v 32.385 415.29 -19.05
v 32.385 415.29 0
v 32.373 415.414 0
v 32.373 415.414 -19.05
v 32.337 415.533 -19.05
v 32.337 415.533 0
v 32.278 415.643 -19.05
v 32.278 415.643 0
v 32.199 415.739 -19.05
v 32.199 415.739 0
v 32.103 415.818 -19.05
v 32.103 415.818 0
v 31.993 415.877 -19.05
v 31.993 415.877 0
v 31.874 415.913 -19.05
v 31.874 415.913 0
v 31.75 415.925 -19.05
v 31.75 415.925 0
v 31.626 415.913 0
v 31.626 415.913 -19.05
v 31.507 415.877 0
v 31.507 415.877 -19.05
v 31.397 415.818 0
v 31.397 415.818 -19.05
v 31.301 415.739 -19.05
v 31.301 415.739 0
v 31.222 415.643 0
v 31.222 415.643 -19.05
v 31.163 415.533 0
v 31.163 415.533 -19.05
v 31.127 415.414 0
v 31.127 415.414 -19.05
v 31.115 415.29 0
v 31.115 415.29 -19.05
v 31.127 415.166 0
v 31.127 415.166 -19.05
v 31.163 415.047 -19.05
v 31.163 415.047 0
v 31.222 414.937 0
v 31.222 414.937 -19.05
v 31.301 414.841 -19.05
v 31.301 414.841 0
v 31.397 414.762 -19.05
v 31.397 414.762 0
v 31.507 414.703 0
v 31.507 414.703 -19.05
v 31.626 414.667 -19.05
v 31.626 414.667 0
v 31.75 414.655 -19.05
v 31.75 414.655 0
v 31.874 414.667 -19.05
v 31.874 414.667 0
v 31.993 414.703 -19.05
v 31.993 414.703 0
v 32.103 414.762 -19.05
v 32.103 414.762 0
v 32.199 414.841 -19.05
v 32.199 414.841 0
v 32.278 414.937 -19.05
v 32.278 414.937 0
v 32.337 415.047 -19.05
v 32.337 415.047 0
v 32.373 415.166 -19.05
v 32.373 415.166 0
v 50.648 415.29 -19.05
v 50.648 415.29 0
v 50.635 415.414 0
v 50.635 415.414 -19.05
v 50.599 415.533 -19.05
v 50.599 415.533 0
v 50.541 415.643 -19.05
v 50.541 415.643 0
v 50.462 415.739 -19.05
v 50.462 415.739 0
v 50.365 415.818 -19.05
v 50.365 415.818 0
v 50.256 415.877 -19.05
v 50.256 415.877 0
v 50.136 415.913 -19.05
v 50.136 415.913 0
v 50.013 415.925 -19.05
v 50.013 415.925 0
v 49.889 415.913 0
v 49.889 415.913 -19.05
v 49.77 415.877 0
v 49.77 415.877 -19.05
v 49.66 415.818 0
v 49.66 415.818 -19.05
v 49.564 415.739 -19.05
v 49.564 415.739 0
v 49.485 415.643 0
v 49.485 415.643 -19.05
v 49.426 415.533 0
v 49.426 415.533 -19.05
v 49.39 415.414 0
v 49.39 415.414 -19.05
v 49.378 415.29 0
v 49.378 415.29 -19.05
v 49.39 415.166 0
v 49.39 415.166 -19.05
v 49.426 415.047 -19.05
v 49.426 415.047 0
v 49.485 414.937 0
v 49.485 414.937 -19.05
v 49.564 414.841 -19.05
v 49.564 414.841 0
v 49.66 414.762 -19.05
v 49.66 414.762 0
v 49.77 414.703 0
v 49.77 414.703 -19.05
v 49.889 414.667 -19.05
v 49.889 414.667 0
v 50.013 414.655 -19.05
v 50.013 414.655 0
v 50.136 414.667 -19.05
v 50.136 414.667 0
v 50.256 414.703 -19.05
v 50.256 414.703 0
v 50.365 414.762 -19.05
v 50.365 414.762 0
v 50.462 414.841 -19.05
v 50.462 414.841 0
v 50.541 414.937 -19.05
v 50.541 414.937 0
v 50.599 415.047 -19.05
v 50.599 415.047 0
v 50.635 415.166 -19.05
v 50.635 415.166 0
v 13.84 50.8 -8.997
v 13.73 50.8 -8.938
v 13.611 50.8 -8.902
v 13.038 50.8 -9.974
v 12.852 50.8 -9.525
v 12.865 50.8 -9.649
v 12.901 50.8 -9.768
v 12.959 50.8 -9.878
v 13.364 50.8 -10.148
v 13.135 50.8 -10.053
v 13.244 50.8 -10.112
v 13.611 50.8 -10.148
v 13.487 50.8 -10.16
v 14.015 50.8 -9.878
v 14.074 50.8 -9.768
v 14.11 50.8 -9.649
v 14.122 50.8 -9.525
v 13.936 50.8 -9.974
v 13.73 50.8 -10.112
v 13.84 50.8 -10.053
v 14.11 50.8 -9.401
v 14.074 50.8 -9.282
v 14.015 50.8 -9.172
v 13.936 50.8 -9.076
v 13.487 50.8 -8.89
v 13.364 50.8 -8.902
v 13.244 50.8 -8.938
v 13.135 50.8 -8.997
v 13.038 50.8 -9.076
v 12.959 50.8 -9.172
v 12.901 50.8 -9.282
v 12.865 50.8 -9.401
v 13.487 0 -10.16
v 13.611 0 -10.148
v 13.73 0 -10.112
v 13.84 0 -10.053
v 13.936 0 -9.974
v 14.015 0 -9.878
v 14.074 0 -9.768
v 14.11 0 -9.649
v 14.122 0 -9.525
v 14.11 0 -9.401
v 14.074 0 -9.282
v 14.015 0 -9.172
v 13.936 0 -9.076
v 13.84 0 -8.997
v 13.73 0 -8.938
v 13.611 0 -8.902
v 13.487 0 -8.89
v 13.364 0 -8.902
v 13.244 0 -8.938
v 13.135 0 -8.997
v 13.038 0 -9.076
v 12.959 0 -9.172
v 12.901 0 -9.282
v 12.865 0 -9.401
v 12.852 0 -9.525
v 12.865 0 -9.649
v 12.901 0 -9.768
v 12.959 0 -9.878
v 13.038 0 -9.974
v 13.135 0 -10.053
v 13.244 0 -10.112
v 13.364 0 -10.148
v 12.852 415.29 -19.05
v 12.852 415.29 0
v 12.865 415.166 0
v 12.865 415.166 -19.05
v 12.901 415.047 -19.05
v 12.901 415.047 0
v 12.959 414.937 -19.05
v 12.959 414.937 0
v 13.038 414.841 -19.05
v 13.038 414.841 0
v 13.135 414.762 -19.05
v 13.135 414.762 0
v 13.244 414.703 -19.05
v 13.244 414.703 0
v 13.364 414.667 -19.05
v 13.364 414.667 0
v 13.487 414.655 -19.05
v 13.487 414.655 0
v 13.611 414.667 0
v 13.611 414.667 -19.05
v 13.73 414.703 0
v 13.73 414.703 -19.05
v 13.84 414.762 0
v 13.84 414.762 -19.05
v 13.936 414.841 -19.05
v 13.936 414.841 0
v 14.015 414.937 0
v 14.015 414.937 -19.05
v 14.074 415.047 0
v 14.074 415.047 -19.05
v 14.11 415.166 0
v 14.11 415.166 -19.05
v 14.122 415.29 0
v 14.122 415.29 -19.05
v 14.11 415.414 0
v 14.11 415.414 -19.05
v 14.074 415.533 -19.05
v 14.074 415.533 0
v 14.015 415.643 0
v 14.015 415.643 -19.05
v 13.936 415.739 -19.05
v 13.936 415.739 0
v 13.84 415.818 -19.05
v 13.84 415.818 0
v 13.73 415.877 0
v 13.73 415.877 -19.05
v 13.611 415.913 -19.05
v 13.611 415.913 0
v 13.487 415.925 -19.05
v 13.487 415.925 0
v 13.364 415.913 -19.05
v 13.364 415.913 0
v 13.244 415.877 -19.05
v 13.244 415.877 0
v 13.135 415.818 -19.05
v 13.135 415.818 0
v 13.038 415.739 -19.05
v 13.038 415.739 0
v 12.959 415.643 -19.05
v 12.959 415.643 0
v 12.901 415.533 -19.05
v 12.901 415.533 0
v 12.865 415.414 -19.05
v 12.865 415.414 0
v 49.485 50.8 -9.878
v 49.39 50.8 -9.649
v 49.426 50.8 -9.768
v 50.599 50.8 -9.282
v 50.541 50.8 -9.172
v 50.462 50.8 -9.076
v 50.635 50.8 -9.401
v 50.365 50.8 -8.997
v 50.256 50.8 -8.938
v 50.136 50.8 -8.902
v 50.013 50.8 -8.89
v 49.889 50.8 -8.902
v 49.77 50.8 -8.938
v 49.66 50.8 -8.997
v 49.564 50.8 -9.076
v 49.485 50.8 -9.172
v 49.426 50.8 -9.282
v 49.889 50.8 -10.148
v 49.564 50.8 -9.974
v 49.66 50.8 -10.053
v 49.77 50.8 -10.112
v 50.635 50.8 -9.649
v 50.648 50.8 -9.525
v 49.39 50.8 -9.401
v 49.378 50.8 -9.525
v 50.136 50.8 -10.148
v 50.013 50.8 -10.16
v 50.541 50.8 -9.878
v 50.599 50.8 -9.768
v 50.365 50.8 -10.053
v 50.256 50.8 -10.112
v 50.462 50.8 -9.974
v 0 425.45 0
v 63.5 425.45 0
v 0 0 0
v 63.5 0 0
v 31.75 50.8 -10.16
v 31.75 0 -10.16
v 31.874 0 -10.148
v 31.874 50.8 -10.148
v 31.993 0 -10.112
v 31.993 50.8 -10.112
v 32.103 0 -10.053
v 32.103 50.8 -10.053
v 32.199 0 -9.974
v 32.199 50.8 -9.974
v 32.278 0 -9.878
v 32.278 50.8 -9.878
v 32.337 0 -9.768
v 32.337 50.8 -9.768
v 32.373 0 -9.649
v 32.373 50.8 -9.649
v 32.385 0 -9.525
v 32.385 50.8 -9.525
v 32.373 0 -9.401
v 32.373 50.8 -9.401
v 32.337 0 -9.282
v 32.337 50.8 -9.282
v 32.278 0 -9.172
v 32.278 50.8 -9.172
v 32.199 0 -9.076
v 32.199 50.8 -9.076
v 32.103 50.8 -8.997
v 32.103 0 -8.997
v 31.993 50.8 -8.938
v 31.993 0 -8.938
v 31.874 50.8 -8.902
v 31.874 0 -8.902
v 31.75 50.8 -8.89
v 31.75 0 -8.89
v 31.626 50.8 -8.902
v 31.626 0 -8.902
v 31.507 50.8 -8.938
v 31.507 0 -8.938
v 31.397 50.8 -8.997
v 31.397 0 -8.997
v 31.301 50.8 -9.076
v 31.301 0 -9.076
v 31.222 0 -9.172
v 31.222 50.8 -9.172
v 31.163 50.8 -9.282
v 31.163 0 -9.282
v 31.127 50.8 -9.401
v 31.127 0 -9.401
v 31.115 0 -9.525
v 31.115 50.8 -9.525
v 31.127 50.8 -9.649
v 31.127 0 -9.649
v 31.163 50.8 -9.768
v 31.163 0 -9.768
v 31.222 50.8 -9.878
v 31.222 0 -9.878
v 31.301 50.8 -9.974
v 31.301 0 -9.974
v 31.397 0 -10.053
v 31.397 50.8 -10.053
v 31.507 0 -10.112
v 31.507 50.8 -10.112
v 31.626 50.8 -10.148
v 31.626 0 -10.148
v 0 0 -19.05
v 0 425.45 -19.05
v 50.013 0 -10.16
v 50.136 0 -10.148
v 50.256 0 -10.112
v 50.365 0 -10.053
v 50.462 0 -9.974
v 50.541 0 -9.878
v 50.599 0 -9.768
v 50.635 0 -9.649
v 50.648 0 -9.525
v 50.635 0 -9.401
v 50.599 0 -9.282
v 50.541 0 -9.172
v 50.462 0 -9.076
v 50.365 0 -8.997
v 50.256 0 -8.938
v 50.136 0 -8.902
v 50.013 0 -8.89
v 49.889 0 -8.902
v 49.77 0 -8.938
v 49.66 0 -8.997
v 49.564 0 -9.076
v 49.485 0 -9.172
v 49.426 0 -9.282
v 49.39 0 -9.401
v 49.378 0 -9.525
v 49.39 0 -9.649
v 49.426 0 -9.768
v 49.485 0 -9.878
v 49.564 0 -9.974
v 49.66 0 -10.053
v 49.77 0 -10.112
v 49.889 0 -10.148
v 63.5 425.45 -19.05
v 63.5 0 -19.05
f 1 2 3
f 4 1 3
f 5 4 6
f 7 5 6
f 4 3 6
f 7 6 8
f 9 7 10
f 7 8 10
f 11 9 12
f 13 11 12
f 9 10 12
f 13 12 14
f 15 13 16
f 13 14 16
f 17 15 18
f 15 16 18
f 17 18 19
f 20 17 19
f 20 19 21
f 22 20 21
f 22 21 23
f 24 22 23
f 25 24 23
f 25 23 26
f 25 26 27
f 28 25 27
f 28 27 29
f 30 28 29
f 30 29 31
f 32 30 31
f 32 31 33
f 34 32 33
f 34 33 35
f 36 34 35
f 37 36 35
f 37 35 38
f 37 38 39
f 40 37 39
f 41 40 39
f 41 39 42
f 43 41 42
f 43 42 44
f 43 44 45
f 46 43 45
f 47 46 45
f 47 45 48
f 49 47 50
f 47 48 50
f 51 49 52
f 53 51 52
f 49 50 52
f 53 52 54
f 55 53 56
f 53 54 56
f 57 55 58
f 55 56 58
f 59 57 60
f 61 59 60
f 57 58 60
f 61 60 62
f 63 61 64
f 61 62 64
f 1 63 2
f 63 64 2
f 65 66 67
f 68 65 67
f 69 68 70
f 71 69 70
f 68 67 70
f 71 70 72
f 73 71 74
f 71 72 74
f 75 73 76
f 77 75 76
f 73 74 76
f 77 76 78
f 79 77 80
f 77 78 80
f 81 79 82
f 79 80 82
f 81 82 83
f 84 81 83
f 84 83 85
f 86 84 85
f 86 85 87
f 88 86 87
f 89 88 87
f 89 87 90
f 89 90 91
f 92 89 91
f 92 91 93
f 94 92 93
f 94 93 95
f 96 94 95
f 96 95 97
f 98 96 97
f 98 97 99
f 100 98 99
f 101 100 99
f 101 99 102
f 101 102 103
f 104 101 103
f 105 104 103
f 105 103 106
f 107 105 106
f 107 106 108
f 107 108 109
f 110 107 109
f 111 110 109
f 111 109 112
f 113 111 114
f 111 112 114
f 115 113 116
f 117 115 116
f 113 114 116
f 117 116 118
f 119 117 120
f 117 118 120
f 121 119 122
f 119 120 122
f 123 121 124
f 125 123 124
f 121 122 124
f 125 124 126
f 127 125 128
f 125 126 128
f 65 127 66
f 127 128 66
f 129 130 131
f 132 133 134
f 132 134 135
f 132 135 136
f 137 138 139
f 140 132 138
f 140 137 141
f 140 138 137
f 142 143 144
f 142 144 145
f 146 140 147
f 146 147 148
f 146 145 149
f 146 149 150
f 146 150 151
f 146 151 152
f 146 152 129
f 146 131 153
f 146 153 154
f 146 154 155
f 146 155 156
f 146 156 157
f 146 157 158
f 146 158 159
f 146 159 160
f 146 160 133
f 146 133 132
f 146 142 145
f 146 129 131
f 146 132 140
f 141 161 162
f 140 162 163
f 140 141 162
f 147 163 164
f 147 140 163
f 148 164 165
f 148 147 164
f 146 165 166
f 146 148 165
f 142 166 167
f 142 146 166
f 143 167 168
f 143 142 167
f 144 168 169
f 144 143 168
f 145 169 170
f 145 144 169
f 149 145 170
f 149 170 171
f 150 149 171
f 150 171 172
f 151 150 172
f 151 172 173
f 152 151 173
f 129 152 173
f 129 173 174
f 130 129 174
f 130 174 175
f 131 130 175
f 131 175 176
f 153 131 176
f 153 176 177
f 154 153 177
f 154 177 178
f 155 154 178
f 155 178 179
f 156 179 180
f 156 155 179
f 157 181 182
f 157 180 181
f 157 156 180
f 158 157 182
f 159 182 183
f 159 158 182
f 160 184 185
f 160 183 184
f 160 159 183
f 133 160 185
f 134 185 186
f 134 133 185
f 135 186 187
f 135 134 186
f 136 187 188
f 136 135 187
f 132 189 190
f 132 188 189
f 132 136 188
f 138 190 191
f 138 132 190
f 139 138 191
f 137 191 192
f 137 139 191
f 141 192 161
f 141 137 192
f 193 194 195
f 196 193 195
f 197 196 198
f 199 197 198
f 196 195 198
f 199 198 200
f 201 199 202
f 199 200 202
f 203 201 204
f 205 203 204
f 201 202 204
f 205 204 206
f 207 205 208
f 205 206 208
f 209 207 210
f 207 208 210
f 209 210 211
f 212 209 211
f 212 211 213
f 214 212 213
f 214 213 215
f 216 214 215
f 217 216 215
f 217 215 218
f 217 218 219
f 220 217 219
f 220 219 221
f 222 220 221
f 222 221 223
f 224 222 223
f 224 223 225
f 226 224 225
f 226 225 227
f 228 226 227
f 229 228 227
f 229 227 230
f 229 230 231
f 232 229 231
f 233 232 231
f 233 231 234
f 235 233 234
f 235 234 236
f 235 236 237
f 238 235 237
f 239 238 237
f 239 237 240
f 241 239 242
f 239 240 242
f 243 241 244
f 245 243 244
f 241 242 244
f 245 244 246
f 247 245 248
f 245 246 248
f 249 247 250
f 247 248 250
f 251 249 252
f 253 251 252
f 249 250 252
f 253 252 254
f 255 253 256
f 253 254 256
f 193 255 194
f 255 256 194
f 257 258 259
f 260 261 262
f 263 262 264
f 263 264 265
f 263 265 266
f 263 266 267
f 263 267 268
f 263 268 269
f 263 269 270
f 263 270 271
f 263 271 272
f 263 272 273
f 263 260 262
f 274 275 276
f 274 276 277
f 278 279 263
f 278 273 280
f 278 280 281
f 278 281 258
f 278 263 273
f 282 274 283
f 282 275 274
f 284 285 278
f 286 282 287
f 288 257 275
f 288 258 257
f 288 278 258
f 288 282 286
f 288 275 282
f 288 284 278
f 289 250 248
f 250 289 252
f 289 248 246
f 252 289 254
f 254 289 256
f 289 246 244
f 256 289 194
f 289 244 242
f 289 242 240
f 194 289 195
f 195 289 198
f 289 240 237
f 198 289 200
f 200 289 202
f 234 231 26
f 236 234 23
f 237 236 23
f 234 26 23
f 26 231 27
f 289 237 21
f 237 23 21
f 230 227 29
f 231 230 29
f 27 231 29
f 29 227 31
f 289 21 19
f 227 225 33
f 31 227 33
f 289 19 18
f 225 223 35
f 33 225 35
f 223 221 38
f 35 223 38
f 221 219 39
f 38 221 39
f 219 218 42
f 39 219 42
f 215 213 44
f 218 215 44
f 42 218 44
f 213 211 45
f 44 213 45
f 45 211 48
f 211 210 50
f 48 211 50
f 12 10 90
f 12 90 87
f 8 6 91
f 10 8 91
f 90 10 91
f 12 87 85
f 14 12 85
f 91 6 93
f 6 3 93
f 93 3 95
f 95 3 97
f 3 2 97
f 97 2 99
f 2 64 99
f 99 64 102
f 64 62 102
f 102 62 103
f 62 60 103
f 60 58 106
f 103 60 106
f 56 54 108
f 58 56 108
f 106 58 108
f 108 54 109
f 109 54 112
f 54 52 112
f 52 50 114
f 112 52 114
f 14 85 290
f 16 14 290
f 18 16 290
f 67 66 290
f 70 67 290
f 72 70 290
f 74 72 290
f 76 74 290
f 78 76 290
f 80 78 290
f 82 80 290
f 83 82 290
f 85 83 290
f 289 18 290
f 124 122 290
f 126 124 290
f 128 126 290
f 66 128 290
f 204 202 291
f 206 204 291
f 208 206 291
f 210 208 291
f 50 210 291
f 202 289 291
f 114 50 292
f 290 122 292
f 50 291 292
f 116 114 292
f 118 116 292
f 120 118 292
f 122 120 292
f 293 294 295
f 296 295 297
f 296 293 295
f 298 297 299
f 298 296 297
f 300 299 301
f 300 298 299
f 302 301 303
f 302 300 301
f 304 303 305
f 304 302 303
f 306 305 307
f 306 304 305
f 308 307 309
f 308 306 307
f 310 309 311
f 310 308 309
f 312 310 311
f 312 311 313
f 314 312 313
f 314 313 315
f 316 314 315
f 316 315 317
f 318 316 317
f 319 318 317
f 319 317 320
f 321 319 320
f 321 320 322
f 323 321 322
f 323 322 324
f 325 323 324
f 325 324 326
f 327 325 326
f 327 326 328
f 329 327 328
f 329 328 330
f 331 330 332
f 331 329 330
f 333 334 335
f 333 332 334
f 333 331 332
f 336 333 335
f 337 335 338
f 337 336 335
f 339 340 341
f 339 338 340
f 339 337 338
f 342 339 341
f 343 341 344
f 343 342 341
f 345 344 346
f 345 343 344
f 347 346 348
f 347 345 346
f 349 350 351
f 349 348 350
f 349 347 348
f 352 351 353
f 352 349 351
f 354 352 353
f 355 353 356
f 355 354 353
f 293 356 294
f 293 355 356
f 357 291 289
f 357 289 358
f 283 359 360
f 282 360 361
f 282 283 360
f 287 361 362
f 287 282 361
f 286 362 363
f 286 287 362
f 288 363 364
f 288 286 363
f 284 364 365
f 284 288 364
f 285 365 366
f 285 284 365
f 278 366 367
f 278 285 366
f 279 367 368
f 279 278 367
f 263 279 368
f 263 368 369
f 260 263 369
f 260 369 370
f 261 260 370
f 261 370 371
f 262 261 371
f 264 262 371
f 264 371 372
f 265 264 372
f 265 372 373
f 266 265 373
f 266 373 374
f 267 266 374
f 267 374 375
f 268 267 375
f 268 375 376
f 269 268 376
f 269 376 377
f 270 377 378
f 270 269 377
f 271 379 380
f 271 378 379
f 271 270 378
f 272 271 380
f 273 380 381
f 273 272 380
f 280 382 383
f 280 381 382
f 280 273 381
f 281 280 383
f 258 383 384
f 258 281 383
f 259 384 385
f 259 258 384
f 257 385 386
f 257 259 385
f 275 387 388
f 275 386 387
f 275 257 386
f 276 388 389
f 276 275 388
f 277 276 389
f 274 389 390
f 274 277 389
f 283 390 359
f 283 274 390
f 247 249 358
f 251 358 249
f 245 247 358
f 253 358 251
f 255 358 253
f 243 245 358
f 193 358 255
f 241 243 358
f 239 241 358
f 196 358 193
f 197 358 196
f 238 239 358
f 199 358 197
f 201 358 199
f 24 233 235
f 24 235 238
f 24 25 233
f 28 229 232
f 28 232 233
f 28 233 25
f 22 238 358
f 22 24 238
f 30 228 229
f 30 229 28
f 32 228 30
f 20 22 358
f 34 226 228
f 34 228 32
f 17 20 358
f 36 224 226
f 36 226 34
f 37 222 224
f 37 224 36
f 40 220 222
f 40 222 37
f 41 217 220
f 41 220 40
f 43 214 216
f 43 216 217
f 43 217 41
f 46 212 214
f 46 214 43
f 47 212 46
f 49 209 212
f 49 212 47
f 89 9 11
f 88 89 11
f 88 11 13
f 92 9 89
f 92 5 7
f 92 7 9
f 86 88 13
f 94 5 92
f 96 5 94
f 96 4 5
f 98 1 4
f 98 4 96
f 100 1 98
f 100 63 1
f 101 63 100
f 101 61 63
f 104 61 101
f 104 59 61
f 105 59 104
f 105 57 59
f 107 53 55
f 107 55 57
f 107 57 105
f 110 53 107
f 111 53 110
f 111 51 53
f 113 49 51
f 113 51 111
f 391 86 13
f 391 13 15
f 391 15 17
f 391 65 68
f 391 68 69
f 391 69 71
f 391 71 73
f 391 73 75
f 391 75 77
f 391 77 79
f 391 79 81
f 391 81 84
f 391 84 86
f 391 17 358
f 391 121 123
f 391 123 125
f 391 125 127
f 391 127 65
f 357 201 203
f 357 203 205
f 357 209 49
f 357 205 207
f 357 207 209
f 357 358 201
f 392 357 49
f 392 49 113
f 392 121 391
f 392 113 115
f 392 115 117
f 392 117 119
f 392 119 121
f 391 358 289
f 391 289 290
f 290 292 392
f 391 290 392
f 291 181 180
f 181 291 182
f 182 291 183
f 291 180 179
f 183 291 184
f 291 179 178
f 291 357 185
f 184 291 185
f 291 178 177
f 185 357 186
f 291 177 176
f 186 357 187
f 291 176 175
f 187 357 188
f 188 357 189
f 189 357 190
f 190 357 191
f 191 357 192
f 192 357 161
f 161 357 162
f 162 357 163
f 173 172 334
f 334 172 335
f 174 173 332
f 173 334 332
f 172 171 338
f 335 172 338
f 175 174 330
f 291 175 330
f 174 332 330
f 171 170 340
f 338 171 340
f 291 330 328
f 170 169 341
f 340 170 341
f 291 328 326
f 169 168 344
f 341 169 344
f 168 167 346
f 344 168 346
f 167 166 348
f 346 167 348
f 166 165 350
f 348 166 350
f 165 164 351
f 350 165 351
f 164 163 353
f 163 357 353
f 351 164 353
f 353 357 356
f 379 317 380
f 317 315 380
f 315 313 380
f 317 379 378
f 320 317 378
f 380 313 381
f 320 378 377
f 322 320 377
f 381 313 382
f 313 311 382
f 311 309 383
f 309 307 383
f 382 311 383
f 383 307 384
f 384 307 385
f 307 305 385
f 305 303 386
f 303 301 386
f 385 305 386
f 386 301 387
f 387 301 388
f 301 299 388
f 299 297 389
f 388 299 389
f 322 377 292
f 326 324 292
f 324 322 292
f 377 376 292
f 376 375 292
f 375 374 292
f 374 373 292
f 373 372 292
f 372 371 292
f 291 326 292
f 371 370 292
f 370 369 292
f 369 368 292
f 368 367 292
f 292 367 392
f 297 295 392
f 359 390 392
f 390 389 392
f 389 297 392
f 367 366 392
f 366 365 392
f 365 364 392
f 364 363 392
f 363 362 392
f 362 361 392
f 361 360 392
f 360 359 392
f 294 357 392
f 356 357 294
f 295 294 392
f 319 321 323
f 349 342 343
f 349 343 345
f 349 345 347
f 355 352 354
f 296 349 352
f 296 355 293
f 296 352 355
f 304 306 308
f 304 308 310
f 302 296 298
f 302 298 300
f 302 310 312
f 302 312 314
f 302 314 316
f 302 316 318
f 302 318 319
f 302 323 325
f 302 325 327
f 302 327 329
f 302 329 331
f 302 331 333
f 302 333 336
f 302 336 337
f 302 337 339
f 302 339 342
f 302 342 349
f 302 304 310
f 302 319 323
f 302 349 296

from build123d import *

# Parameters (mm, degrees)
SKETCH2_W               = 63.5
SKETCH2_H               = 19.05
BOSS_EXTRUDE1_DEPTH     = 425.45
CUT_EXTRUDE1_DEPTH      = 431.584318107
CUT_EXTRUDE1_DEPTH_BACK = 50.8
SKETCH3_R               = 0.635
SKETCH4_R               = 0.635
CUT_EXTRUDE2_DEPTH      = 431.584318107


with BuildPart() as part:
    # Sketch2 → Boss-Extrude1 (new body)
    with BuildSketch(Plane(origin=(0, 0, 0), x_dir=(1, 0, 0), z_dir=(0, 1, 0))):
        with Locations((31.75, 9.525)):
            Rectangle(SKETCH2_W, SKETCH2_H)
    extrude(amount=BOSS_EXTRUDE1_DEPTH)

    # Sketch3 → Cut-Extrude1 (cut, two sides: drawn at the far end of the back side and taken through both)
    with BuildSketch(Plane.XZ.offset(-CUT_EXTRUDE1_DEPTH_BACK)):
        with Locations(Location((13.4874, -9.525, 0), (0, 0, 270))):
            Circle(SKETCH3_R)
        with Locations(Location((31.75, -9.525, 0), (0, 0, 270))):
            Circle(SKETCH3_R)
        with Locations(Location((50.0126, -9.525, 0), (0, 0, 270))):
            Circle(SKETCH3_R)
    extrude(amount=CUT_EXTRUDE1_DEPTH + CUT_EXTRUDE1_DEPTH_BACK, mode=Mode.SUBTRACT)

    # Sketch4 → Cut-Extrude2 (cut, through all)
    with BuildSketch(Plane.XY):
        with Locations((31.75, 415.29)):
            Circle(SKETCH4_R)
        with Locations((50.0126, 415.29)):
            Circle(SKETCH4_R)
        with Locations(Location((13.4874, 415.29, 0), (0, 0, 180))):
            Circle(SKETCH4_R)
    extrude(amount=-CUT_EXTRUDE2_DEPTH, mode=Mode.SUBTRACT)


solid = part.part
